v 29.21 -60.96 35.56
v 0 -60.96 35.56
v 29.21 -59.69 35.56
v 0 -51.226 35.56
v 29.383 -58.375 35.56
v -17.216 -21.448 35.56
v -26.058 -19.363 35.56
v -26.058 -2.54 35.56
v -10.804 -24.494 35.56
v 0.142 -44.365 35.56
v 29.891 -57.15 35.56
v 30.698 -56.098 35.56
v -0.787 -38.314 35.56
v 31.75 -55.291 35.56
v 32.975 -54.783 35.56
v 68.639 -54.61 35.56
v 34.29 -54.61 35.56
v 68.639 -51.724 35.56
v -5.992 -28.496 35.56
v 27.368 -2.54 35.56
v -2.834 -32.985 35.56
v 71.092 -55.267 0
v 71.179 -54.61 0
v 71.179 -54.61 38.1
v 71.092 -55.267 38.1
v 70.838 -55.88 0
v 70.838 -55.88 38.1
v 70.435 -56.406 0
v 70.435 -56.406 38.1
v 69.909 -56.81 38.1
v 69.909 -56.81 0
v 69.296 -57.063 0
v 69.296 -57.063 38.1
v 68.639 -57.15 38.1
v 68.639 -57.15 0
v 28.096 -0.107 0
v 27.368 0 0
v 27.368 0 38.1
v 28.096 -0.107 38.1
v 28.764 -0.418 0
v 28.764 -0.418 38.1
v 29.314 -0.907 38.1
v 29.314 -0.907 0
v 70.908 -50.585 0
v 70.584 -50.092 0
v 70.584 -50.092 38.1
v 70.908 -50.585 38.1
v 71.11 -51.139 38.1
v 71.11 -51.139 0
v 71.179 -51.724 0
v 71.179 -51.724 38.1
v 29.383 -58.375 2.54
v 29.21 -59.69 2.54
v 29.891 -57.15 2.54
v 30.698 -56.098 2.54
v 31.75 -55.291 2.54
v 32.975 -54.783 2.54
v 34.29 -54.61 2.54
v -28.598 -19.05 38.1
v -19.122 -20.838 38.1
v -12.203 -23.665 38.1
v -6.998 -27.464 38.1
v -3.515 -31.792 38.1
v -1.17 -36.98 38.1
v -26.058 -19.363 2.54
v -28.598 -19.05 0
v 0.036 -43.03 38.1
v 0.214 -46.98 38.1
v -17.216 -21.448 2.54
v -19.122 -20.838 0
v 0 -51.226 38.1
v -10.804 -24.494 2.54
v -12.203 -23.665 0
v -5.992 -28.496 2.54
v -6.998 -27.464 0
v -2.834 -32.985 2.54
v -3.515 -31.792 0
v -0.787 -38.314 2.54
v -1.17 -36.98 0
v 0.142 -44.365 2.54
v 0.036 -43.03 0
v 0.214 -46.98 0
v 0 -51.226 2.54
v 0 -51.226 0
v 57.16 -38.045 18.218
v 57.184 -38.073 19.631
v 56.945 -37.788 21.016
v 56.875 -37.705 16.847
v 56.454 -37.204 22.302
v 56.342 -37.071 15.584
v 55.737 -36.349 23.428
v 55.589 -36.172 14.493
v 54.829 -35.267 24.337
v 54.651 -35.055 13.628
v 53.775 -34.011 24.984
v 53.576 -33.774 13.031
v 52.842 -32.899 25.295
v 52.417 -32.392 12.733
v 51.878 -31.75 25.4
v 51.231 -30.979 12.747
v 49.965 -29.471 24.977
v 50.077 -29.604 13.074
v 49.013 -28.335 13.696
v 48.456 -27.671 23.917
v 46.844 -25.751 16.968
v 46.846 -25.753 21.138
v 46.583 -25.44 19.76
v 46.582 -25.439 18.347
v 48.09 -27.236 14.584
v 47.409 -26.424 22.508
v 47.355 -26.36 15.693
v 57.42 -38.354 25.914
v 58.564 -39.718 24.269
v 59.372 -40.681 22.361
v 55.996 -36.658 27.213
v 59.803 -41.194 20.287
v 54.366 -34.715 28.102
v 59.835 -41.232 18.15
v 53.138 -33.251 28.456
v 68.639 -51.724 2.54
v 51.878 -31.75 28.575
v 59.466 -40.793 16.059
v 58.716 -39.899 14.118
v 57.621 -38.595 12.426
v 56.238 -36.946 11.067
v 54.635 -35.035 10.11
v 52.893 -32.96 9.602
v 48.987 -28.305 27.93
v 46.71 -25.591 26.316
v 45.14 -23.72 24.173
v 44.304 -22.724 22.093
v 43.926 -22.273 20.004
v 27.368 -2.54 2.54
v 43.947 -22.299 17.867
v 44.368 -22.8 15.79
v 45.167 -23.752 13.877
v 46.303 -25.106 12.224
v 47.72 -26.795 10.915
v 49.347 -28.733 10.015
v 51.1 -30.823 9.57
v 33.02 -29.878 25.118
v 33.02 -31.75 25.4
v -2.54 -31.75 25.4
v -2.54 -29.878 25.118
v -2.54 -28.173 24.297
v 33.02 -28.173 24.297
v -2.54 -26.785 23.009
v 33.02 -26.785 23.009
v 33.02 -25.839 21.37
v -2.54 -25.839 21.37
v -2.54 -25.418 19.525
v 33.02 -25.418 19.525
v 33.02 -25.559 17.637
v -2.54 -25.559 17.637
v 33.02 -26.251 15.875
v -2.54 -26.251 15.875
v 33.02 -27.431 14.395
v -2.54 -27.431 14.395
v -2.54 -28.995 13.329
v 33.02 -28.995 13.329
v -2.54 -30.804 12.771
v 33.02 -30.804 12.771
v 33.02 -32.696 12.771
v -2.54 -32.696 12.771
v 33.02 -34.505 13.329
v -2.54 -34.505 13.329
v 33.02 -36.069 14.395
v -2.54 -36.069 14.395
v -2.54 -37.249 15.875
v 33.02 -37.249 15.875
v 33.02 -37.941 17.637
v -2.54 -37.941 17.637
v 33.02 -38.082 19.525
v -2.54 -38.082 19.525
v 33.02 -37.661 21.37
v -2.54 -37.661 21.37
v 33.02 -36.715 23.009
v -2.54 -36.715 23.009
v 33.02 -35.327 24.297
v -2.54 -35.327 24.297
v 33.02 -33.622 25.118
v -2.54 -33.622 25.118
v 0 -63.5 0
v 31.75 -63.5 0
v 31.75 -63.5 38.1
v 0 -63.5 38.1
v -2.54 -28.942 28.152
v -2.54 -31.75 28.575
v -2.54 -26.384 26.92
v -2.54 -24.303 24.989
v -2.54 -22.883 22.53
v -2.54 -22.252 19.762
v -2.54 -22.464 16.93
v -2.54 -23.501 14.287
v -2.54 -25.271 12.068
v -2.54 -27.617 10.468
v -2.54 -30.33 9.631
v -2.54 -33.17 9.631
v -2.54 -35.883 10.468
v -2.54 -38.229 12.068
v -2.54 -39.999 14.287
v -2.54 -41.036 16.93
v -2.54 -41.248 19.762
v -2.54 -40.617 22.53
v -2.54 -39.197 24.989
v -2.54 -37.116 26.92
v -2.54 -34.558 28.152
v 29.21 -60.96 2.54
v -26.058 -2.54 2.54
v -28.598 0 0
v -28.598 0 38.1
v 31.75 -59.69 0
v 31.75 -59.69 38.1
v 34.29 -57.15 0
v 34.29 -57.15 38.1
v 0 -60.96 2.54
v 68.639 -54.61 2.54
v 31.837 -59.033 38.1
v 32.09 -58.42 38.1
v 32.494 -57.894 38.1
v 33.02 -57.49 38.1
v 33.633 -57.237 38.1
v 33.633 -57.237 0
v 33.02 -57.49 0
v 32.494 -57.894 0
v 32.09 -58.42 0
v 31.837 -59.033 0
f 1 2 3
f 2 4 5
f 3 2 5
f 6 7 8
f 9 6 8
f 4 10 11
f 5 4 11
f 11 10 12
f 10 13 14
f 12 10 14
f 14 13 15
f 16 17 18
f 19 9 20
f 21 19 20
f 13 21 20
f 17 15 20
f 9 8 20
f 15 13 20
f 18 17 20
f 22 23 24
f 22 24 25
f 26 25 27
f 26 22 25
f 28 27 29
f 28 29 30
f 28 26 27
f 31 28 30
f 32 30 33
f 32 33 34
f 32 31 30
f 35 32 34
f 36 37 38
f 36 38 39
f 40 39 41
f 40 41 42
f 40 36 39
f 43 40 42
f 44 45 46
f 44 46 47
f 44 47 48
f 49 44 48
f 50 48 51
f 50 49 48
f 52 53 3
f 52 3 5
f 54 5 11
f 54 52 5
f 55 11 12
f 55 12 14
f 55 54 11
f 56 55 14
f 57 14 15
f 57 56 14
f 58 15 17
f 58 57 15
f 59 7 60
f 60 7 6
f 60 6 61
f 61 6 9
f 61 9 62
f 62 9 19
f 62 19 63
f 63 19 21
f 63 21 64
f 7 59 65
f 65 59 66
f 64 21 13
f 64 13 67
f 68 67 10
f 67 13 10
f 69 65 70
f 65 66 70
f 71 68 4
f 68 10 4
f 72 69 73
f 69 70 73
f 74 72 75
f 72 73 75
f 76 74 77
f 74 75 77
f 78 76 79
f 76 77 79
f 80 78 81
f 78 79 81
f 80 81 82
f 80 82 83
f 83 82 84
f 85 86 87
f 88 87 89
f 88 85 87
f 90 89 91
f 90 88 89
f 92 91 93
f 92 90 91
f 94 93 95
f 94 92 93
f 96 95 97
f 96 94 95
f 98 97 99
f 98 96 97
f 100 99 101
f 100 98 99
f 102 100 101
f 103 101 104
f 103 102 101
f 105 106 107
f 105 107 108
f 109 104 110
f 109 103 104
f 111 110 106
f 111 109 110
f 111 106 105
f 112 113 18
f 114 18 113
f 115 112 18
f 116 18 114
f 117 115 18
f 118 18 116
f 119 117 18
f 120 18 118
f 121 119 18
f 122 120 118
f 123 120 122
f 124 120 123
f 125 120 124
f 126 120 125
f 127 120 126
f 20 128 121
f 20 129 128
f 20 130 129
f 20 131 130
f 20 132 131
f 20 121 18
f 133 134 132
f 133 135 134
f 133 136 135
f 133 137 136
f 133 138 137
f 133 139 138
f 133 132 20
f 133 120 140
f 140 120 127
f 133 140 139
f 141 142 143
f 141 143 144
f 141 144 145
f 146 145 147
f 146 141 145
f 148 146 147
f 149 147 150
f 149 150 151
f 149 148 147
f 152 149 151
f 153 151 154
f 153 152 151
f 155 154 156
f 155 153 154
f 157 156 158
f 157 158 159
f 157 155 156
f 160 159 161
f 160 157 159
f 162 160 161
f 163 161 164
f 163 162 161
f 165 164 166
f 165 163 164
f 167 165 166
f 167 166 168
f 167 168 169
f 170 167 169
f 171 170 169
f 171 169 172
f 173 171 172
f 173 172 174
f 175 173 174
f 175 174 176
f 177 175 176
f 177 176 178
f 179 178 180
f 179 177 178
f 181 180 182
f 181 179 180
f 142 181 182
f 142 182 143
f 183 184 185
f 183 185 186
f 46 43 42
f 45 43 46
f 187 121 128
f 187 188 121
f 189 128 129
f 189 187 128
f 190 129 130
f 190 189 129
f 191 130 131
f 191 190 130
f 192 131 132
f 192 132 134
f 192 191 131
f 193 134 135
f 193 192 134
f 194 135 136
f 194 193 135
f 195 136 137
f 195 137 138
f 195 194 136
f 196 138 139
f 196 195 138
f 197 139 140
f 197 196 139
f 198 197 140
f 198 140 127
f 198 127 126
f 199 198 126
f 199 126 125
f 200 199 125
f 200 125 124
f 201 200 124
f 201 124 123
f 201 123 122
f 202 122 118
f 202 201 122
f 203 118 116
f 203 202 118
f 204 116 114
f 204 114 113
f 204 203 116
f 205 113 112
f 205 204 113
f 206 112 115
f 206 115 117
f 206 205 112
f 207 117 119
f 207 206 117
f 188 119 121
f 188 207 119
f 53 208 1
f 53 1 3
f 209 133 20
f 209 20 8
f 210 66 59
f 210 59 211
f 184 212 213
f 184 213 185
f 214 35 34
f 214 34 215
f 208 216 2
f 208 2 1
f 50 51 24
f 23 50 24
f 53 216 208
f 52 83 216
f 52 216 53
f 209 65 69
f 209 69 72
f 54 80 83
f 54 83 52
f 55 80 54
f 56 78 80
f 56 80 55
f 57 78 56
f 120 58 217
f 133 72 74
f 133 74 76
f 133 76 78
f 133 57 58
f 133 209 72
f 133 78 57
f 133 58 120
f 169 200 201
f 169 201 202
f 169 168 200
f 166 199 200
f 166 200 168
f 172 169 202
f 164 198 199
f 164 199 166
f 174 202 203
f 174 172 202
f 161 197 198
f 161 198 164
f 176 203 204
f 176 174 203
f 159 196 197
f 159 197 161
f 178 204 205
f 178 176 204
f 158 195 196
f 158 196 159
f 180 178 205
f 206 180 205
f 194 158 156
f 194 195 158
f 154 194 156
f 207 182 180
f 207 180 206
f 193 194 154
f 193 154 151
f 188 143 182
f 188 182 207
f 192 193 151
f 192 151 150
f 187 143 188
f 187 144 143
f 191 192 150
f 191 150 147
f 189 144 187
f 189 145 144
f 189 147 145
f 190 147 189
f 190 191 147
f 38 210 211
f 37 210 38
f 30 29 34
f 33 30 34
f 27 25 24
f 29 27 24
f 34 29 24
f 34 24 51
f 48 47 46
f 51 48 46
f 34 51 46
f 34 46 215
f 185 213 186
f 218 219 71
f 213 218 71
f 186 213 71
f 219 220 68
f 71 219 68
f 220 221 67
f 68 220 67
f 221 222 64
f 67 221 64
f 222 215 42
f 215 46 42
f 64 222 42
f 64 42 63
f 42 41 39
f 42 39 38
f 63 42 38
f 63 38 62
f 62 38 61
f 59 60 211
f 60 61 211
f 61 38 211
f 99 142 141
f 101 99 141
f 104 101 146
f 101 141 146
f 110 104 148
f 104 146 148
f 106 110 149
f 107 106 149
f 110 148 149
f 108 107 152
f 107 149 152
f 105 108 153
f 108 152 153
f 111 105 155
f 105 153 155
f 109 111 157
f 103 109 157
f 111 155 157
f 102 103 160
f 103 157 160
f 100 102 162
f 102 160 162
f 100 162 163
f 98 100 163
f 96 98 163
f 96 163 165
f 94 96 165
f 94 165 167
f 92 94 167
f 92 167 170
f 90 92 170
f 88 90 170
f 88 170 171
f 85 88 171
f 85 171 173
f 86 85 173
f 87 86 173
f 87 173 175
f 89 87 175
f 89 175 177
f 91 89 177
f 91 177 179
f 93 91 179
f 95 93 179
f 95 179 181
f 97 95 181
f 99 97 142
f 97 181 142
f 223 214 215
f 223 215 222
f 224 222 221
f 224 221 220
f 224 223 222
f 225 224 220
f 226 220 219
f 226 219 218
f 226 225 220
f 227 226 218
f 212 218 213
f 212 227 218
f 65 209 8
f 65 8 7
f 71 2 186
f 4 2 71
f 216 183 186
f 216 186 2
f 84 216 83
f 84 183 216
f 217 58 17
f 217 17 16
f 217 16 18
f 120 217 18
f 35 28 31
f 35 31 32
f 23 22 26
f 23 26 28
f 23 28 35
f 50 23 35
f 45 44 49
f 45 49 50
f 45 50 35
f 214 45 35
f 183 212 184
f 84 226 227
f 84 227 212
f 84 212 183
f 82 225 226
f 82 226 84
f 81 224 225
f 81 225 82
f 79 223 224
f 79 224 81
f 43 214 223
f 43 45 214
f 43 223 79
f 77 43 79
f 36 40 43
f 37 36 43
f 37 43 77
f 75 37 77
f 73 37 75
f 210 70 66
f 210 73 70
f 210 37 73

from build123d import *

# Parameters (mm, degrees)
BOSS_EXTRUDE1_DEPTH             = 38.1
SHELL1_START                    = 2.54
SHELL1_DEPTH                    = 33.02
SKETCH2_R                       = 9.525
SKETCH2_R_2                     = 6.35
BOSS_EXTRUDE2_DEPTH             = 35.56
BOSS_EXTRUDE2_DIRECTION_2_REACH = 98.336


# Read off the part's stored shape, not the designer's step: Shell1
with BuildPart() as part:
    # Sketch1 → Boss-Extrude1 (new body)
    with BuildSketch(Plane.XY):
        with BuildLine():
            Line((-28.597743471, 0), (27.367835077, 0))
            ThreePointArc((27.367835077, 0), (28.441285462, -0.237978221), (29.313587963, -0.907319471))
            Line((29.313587963, -0.907319471), (70.584270678, -50.091803866))
            ThreePointArc((70.584270678, -50.091803866), (71.025337049, -50.855753231), (71.178517793, -51.724484395))
            Line((71.178517793, -51.724484395), (71.178517793, -54.61))
            ThreePointArc((71.178517793, -54.61), (70.434569017, -56.406051224), (68.638517793, -57.15))
            Line((68.638517793, -57.15), (34.29, -57.15))
            ThreePointArc((34.29, -57.15), (32.493948776, -57.893948776), (31.75, -59.69))
            Line((31.75, -59.69), (31.75, -63.5))
            Line((31.75, -63.5), (0, -63.5))
            Line((0, -63.5), (0, -51.225562477))
            add(Edge.make_bspline(
                [(-28.597743471, -19.05), (2.699862554, -22.282217033), (0, -51.225562477)],
                knots=[0, 0, 0, 1, 1, 1], degree=2))
            Line((-28.597743471, -19.05), (-28.597743471, 0))
        make_face()
    extrude(amount=BOSS_EXTRUDE1_DEPTH)

    # Shell1 outline → Shell1 (cut)
    with BuildSketch(Plane.XY.offset(SHELL1_START)):
        with BuildLine():
            Line((-26.057743471, -2.54), (-26.057743471, -19.362677405))
            add(Edge.make_bspline(
                [(-26.057743471, -19.362677405), (2.587779826, -23.483777864), (0, -51.225562477)],
                knots=[0.041514235, 0.041514235, 0.041514235, 1, 1, 1], degree=2))
            Line((0, -51.225562477), (0, -60.96))
            Line((0, -60.96), (29.21, -60.96))
            Line((29.21, -60.96), (29.21, -59.69))
            ThreePointArc((29.21, -59.69), (30.697897552, -56.097897552), (34.29, -54.61))
            Line((34.29, -54.61), (68.638517793, -54.61))
            Line((68.638517793, -54.61), (68.638517793, -51.724484395))
            Line((68.638517793, -51.724484395), (27.367835077, -2.54))
            Line((27.367835077, -2.54), (-26.057743471, -2.54))
        make_face()
    extrude(amount=SHELL1_DEPTH, mode=Mode.SUBTRACT)

    # Sketch2 → Boss-Extrude2 (add)
    with BuildSketch(Plane.ZY.offset(-33.02)):
        with Locations((19.05, -31.75)):
            Circle(SKETCH2_R)
        with Locations((19.05, -31.75)):
            Circle(SKETCH2_R_2, mode=Mode.SUBTRACT)
    extrude(amount=BOSS_EXTRUDE2_DEPTH)

    # Boss-Extrude2 direction 2: up to this face of the body (flat: up to its plane)
    boss_extrude2_direction_2_end = Plane(part.part.faces().sort_by_distance((48.003176435, -27.132242197, 19.05))[0])
    # Sketch2 → Boss-Extrude2 direction 2 (add, up to the picked face)
    with BuildSketch(Plane.ZY.offset(-33.02), mode=Mode.PRIVATE) as boss_extrude2_direction_2_sk1:
        with Locations((19.05, -31.75)):
            Circle(SKETCH2_R)
        with Locations((19.05, -31.75)):
            Circle(SKETCH2_R_2, mode=Mode.SUBTRACT)
    boss_extrude2_direction_2_tool1 = split(extrude(boss_extrude2_direction_2_sk1.sketch, amount=-BOSS_EXTRUDE2_DIRECTION_2_REACH, mode=Mode.PRIVATE), bisect_by=boss_extrude2_direction_2_end, keep=Keep.BOTH, mode=Mode.PRIVATE)
    add(boss_extrude2_direction_2_tool1.solids().sort_by(Axis((33.02, -31.75, 9.794408), (1, 0, 0)))[0])


solid = part.part
